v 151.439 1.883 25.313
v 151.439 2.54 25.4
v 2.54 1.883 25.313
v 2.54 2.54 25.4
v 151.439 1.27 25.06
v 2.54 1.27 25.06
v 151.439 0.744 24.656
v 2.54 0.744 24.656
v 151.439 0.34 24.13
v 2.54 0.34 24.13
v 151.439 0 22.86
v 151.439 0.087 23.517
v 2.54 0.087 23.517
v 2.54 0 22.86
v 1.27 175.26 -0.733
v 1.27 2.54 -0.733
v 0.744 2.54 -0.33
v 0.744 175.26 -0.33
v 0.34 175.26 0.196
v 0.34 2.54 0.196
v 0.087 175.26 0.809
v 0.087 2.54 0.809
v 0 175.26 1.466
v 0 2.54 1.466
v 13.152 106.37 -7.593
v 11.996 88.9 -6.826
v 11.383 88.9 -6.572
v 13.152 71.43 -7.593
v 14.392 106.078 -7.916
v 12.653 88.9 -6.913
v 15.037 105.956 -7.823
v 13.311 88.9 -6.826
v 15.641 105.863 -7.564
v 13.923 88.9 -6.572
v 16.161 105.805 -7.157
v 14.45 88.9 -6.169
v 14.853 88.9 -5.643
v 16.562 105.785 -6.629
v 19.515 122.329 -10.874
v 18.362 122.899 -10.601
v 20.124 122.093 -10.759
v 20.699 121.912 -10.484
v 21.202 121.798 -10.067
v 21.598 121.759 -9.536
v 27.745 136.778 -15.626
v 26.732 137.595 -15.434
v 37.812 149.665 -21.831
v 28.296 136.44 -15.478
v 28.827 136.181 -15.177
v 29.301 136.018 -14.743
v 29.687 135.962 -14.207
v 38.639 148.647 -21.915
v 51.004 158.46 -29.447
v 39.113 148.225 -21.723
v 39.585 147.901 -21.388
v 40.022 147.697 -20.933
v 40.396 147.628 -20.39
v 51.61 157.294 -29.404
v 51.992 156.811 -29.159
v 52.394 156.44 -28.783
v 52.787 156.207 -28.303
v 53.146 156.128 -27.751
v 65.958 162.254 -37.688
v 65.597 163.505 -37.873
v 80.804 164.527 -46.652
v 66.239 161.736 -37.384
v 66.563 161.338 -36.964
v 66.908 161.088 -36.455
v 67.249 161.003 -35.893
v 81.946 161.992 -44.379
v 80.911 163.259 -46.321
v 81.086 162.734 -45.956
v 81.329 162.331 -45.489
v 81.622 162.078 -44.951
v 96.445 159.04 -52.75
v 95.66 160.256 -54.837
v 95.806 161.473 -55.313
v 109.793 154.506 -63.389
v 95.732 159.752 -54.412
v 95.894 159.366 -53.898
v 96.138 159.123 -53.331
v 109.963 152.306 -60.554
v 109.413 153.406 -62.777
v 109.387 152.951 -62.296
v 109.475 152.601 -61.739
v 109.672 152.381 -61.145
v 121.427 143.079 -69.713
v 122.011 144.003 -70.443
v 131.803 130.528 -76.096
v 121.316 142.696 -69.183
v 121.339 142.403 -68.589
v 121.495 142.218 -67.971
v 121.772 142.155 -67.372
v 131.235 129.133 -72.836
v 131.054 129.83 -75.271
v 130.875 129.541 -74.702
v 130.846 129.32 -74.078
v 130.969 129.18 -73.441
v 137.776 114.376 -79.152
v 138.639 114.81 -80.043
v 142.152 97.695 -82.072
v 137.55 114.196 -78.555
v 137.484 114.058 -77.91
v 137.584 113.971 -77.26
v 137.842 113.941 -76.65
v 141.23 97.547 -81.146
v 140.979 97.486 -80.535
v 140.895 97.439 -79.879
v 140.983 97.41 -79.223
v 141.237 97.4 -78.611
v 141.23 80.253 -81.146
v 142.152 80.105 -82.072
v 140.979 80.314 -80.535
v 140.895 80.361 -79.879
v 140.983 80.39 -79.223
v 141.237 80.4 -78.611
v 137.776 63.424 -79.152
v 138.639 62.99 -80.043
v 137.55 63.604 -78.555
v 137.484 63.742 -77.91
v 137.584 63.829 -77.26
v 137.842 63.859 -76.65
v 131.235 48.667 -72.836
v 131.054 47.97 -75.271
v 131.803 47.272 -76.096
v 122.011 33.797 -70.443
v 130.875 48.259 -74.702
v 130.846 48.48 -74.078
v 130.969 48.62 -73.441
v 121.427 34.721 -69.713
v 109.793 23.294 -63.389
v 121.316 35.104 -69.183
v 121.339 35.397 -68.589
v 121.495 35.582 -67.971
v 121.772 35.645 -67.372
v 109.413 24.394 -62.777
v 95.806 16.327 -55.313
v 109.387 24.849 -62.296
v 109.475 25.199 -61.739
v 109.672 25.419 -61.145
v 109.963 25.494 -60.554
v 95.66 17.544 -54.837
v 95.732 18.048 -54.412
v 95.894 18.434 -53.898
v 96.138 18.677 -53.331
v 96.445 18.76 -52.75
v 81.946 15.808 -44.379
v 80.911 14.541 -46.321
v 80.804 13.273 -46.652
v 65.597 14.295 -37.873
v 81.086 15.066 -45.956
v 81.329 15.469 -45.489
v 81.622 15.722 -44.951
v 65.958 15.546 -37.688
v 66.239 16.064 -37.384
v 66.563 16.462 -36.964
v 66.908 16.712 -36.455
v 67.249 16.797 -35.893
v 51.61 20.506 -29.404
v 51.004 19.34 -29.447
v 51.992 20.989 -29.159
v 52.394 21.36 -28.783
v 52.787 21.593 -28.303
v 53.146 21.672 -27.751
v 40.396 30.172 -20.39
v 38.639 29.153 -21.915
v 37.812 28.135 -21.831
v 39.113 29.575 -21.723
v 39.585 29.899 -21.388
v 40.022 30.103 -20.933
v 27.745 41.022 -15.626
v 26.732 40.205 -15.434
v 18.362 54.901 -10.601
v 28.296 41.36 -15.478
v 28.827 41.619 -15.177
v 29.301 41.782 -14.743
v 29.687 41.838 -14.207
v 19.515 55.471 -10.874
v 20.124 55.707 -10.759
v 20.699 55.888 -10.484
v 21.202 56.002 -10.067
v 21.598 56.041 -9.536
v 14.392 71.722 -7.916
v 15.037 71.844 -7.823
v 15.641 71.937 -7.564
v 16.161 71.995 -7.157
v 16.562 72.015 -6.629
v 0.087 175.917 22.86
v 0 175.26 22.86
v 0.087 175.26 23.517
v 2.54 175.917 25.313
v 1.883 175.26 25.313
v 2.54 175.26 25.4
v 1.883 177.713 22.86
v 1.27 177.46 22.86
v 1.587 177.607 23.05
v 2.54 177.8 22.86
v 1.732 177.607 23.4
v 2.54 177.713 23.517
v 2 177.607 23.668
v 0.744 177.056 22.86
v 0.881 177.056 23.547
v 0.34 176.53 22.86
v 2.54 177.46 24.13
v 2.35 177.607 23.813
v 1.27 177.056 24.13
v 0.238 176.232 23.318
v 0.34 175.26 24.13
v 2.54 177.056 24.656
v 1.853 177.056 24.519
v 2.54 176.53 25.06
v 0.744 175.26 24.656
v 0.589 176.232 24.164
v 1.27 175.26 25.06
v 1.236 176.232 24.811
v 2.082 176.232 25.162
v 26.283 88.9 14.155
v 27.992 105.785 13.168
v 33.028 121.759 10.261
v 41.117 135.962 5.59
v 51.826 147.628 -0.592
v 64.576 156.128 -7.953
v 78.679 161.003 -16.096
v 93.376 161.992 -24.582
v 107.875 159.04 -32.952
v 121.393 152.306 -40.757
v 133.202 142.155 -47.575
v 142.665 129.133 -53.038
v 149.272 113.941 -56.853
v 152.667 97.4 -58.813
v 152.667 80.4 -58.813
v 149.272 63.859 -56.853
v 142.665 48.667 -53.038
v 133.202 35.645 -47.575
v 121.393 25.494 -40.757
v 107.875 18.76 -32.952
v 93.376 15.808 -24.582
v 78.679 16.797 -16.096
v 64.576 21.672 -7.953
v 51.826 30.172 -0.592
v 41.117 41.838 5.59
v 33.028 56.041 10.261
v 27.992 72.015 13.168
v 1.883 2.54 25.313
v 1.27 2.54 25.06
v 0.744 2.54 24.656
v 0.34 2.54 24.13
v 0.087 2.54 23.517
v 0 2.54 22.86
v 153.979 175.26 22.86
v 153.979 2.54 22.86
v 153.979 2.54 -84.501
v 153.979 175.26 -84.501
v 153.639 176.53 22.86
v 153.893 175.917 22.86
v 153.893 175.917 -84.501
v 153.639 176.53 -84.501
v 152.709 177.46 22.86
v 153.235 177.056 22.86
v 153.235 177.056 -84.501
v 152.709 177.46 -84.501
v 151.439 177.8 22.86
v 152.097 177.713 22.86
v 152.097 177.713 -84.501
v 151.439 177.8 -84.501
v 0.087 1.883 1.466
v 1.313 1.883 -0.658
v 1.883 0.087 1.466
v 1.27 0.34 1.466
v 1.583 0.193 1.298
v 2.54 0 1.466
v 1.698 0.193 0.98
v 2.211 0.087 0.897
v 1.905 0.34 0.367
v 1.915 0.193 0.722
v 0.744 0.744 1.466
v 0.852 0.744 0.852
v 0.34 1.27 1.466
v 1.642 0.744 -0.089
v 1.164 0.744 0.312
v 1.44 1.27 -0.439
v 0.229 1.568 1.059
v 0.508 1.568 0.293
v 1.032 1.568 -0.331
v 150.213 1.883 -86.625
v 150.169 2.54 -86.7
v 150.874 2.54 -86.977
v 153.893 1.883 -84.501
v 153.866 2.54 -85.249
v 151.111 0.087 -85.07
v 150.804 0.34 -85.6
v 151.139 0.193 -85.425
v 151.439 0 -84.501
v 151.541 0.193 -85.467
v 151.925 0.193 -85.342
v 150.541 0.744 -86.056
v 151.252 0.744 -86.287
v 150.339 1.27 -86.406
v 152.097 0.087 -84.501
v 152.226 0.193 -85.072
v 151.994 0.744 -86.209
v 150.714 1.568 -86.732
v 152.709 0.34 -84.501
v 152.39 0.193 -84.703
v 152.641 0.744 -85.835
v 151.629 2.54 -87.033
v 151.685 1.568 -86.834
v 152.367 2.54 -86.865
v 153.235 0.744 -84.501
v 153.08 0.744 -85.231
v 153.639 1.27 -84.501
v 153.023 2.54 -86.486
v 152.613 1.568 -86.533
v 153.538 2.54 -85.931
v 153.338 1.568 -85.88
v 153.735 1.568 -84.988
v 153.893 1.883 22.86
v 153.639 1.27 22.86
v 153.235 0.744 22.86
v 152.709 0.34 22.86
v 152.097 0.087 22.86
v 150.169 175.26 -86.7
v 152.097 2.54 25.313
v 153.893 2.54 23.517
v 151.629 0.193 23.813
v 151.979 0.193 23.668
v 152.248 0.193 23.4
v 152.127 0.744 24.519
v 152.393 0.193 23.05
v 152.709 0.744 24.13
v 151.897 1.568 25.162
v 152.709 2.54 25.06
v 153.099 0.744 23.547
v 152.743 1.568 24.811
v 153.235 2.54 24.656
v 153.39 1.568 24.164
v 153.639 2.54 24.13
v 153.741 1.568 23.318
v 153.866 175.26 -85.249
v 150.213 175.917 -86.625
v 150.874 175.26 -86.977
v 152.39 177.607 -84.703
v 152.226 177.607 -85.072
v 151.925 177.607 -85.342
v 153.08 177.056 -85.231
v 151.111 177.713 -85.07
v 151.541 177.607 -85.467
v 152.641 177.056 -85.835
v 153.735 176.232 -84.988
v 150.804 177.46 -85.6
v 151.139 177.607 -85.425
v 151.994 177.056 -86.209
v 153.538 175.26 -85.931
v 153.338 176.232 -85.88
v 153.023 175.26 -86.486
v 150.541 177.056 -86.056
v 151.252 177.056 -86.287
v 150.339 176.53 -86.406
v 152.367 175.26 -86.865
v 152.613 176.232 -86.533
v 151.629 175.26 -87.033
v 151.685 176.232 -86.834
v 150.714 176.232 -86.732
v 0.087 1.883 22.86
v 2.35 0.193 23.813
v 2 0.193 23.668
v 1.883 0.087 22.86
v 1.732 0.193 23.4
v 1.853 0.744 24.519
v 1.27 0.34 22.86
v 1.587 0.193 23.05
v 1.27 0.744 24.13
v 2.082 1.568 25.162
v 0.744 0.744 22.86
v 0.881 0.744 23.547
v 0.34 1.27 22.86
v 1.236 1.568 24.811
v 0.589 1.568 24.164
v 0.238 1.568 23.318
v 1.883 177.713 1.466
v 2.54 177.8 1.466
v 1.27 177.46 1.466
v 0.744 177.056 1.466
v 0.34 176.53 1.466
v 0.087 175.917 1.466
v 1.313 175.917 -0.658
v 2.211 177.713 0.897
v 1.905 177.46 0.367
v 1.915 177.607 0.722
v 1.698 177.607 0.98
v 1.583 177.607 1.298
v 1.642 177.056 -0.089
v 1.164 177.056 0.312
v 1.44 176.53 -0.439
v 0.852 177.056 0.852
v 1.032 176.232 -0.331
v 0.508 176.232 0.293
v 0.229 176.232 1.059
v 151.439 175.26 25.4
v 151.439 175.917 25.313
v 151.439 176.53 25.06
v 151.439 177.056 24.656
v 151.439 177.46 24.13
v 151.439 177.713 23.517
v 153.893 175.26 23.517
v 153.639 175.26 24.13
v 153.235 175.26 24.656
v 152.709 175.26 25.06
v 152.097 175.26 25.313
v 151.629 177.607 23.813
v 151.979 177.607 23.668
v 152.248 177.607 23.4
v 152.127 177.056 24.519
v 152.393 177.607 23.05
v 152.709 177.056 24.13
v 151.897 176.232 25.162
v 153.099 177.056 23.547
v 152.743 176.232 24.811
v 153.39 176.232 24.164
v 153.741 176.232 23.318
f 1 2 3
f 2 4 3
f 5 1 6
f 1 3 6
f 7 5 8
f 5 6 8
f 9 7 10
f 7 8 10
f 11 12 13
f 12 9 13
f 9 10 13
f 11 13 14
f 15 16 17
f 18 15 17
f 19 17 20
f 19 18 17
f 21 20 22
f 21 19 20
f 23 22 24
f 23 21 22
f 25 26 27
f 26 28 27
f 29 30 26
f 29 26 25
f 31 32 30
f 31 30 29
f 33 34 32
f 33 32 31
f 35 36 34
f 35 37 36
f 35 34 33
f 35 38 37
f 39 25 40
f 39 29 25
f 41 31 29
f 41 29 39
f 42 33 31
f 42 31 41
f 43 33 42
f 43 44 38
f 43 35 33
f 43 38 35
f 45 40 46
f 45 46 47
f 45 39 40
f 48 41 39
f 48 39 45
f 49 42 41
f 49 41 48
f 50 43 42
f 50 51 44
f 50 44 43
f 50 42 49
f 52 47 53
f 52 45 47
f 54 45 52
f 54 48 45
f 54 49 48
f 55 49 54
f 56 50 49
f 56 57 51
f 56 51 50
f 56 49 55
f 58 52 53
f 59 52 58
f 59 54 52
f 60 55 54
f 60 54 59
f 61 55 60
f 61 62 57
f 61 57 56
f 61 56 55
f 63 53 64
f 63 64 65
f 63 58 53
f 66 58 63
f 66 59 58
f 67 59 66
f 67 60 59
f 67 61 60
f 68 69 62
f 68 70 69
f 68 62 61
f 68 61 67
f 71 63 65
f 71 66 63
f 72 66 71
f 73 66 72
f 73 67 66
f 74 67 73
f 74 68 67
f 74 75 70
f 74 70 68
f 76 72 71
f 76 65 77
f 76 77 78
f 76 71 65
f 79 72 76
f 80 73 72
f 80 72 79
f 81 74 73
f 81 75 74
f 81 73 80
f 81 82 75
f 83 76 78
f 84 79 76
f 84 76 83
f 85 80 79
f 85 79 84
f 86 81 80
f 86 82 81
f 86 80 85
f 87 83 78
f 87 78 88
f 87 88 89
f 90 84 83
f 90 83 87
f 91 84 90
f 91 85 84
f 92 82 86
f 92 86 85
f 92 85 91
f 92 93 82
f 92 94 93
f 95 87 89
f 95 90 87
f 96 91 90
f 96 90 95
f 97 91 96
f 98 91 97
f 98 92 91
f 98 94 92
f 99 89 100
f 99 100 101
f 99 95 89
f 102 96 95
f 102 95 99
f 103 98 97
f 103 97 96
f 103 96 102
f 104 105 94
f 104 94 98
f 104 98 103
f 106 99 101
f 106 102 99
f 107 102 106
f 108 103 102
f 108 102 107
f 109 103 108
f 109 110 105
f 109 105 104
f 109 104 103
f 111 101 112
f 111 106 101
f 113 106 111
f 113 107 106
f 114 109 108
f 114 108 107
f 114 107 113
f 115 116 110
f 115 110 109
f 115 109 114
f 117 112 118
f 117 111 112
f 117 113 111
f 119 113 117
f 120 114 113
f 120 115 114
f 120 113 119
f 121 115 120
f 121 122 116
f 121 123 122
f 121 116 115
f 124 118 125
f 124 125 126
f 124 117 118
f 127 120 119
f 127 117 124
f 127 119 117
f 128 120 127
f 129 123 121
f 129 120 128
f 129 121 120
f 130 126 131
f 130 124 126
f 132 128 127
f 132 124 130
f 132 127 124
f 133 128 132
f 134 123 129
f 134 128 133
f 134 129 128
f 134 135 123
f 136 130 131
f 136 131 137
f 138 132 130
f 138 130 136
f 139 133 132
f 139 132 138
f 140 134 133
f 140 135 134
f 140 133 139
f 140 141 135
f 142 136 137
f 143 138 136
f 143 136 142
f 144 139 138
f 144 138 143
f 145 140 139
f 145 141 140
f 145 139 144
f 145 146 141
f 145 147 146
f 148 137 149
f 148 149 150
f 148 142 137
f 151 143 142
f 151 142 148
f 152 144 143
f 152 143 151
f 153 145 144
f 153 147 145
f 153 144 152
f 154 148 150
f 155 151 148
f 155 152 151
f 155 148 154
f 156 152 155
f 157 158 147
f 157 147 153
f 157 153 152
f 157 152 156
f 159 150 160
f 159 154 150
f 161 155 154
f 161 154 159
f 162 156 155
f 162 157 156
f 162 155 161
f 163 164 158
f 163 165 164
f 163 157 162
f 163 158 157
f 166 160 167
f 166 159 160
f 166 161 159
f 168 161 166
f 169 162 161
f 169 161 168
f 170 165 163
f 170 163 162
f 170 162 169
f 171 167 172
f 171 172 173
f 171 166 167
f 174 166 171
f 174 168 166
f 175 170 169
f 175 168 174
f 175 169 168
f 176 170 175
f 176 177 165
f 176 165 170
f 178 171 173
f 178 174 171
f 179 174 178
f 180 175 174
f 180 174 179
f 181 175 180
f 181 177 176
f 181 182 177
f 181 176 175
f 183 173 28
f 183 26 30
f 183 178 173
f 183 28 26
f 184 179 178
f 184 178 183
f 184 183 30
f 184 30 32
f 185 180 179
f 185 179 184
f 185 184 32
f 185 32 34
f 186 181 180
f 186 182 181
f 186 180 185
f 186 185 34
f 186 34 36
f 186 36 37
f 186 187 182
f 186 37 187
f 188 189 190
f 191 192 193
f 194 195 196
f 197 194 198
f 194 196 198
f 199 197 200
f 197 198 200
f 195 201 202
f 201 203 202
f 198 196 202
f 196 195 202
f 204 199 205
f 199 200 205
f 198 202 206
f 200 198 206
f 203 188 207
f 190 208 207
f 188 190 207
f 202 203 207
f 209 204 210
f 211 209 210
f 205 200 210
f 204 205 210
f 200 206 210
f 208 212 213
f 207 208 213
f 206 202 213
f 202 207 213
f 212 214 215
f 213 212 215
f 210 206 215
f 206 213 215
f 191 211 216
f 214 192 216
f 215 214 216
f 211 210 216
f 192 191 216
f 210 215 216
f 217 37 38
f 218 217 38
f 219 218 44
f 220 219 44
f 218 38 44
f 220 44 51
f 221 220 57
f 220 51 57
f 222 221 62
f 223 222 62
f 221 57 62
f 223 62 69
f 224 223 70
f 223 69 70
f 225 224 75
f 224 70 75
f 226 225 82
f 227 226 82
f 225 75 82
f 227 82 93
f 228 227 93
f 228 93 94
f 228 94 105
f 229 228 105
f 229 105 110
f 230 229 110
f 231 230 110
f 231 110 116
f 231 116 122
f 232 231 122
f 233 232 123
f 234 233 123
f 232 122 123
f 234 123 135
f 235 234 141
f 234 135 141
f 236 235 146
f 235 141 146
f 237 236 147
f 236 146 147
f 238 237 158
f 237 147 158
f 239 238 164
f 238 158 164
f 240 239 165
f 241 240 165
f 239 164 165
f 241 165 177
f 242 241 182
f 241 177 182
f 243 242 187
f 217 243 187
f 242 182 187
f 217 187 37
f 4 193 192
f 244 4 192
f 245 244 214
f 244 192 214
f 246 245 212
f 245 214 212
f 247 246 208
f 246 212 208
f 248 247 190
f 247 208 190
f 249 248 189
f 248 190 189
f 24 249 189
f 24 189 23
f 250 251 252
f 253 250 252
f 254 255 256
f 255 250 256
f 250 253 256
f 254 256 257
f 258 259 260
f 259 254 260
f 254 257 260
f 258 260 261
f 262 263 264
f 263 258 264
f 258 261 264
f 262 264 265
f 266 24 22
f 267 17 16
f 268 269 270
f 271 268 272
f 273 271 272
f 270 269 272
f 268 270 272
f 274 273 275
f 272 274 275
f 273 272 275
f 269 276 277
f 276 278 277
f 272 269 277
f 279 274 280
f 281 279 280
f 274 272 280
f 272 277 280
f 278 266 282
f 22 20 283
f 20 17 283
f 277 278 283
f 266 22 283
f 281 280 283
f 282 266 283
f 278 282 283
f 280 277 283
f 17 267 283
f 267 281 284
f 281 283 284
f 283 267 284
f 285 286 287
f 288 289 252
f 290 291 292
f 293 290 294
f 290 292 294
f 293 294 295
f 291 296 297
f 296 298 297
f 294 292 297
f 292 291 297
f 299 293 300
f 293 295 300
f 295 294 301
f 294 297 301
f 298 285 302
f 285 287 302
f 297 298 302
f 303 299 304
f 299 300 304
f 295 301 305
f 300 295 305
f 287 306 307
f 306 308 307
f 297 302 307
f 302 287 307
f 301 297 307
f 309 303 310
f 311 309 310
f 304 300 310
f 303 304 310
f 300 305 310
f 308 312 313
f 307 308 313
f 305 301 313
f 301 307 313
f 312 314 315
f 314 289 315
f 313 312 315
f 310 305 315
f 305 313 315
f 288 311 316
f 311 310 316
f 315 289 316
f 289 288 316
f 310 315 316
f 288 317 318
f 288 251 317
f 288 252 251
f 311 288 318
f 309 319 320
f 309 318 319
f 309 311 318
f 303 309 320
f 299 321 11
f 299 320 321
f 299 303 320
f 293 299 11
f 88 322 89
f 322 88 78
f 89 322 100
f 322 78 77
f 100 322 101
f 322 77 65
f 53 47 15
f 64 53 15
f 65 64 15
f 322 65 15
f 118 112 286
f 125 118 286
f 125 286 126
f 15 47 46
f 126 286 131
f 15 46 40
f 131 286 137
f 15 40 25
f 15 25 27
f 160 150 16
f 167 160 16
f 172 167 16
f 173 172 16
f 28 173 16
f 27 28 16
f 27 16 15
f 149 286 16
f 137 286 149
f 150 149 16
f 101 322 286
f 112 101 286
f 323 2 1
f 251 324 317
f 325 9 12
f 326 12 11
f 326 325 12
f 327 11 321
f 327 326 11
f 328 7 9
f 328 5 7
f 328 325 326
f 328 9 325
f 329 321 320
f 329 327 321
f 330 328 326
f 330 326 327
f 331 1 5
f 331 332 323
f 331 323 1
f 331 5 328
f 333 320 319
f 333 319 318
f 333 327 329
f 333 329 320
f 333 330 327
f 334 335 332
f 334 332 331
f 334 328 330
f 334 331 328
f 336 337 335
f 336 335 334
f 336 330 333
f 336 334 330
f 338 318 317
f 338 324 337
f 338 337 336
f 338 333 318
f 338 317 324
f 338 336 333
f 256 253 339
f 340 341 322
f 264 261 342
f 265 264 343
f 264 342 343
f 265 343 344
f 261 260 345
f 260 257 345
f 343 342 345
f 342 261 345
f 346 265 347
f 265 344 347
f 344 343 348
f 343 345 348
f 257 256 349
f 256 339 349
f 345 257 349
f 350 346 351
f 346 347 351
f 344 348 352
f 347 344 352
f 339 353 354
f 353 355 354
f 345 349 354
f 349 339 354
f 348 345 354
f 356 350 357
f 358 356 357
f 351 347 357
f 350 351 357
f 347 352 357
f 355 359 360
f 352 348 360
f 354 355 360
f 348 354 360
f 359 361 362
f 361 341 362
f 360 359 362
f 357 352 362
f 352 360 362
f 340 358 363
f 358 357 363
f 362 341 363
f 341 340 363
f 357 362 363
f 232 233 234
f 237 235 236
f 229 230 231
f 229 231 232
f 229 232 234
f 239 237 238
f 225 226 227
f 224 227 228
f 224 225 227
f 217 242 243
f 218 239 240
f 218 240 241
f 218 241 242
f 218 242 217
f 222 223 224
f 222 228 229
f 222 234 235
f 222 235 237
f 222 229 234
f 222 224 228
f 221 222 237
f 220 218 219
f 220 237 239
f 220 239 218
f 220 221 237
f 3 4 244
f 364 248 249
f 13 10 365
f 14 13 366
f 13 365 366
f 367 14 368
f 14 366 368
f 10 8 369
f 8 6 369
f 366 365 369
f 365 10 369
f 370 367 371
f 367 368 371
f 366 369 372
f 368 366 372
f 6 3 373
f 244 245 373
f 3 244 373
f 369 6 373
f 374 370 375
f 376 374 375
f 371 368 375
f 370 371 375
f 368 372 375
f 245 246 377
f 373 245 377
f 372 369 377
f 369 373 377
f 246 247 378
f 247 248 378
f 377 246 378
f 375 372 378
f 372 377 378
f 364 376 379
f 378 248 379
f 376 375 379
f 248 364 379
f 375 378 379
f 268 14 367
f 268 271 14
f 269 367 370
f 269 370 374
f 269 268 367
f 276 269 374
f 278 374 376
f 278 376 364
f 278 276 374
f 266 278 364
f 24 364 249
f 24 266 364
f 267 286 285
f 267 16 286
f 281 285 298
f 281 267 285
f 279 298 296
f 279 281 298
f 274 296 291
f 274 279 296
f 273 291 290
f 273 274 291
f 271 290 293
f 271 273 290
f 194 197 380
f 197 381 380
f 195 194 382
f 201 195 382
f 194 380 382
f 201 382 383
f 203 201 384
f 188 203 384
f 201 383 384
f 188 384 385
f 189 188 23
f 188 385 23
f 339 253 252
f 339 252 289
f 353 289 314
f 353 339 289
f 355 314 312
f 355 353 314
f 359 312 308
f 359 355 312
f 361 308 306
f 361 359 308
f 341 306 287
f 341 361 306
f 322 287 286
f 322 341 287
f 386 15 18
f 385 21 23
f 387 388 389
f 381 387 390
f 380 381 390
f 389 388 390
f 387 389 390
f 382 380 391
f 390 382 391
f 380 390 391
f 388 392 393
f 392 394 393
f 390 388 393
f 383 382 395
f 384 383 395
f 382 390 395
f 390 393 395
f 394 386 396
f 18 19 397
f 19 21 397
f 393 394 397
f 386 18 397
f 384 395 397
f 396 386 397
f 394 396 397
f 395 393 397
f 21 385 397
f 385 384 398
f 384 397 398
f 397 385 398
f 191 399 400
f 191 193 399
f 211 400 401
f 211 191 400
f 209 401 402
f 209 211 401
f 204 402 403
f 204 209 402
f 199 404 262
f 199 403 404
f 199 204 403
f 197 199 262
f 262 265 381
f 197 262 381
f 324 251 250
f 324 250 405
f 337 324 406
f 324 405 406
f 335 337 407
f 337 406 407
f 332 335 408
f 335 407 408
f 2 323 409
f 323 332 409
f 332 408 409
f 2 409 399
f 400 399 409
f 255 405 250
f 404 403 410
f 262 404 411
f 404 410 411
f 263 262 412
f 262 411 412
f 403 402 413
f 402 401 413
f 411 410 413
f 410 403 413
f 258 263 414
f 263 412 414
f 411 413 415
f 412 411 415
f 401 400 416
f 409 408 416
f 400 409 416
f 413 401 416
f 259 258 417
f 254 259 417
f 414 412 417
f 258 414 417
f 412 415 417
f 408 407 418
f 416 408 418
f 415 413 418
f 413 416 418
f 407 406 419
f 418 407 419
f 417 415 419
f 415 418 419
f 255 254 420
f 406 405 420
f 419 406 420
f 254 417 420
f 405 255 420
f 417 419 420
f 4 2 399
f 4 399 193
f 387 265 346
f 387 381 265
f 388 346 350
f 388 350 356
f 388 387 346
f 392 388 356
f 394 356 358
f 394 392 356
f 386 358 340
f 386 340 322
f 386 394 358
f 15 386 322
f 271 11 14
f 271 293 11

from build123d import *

# Parameters (mm, degrees)
BOSS_EXTRUDE1_DEPTH = 177.8
SKETCH4_W           = 153.979316793
SKETCH4_H           = 25.4
BOSS_EXTRUDE4_DEPTH = 177.8
SKETCH3_R           = 73.2155
CUT_EXTRUDE2_DEPTH  = 25.4
FILLET1_R           = 2.54


with BuildPart() as part:
    # Sketch2 → Boss-Extrude1 (new body)
    with BuildSketch(Plane(origin=(0, 0, 0), x_dir=(1, 0, 0), z_dir=(0, 1, 0))):
        Polygon((0, 0), (153.979316793, 0), (153.979316793, 88.9), align=None)
    extrude(amount=BOSS_EXTRUDE1_DEPTH)

    # Sketch4 → Boss-Extrude4 (add)
    with BuildSketch(Plane(origin=(0, 0, 0), x_dir=(-1, 0, 0), z_dir=(0, -1, 0))):
        with Locations((-76.989658397, -12.7)):
            Rectangle(SKETCH4_W, SKETCH4_H)
    extrude(amount=-BOSS_EXTRUDE4_DEPTH)

    # Sketch3 → Cut-Extrude2 (cut)
    with BuildSketch(Plane(origin=(0, 0, 0), x_dir=(-0.8660254037844386, 0, 0.5), z_dir=(-0.5000000000000001, 0, -0.8660254037844387))):
        with Locations((-88.9, 88.9)):
            Circle(SKETCH3_R)
    extrude(amount=-CUT_EXTRUDE2_DEPTH, mode=Mode.SUBTRACT)

    # Fillet1
    fillet1_edges = [part.edges().sort_by_distance(p)[0] for p in [
        (153.979316793, 88.9, 25.4),
        (0, 88.9, 25.4),
        (76.989658396, 0, 25.4),
        (0, 0, 12.7),
        (76.989658396, 177.8, -44.45),
        (0, 177.8, 12.7),
        (76.989658396, 177.8, 25.4),
        (140.396141347, 88.9, -81.05775),
        (76.989658396, 0, -44.45),
        (153.979316793, 0, -31.75),
        (0, 88.9, 0),
        (153.979316793, 88.9, -88.9),
        (153.979316793, 177.8, -31.75),
    ]]
    fillet(fillet1_edges, radius=FILLET1_R)


solid = part.part
